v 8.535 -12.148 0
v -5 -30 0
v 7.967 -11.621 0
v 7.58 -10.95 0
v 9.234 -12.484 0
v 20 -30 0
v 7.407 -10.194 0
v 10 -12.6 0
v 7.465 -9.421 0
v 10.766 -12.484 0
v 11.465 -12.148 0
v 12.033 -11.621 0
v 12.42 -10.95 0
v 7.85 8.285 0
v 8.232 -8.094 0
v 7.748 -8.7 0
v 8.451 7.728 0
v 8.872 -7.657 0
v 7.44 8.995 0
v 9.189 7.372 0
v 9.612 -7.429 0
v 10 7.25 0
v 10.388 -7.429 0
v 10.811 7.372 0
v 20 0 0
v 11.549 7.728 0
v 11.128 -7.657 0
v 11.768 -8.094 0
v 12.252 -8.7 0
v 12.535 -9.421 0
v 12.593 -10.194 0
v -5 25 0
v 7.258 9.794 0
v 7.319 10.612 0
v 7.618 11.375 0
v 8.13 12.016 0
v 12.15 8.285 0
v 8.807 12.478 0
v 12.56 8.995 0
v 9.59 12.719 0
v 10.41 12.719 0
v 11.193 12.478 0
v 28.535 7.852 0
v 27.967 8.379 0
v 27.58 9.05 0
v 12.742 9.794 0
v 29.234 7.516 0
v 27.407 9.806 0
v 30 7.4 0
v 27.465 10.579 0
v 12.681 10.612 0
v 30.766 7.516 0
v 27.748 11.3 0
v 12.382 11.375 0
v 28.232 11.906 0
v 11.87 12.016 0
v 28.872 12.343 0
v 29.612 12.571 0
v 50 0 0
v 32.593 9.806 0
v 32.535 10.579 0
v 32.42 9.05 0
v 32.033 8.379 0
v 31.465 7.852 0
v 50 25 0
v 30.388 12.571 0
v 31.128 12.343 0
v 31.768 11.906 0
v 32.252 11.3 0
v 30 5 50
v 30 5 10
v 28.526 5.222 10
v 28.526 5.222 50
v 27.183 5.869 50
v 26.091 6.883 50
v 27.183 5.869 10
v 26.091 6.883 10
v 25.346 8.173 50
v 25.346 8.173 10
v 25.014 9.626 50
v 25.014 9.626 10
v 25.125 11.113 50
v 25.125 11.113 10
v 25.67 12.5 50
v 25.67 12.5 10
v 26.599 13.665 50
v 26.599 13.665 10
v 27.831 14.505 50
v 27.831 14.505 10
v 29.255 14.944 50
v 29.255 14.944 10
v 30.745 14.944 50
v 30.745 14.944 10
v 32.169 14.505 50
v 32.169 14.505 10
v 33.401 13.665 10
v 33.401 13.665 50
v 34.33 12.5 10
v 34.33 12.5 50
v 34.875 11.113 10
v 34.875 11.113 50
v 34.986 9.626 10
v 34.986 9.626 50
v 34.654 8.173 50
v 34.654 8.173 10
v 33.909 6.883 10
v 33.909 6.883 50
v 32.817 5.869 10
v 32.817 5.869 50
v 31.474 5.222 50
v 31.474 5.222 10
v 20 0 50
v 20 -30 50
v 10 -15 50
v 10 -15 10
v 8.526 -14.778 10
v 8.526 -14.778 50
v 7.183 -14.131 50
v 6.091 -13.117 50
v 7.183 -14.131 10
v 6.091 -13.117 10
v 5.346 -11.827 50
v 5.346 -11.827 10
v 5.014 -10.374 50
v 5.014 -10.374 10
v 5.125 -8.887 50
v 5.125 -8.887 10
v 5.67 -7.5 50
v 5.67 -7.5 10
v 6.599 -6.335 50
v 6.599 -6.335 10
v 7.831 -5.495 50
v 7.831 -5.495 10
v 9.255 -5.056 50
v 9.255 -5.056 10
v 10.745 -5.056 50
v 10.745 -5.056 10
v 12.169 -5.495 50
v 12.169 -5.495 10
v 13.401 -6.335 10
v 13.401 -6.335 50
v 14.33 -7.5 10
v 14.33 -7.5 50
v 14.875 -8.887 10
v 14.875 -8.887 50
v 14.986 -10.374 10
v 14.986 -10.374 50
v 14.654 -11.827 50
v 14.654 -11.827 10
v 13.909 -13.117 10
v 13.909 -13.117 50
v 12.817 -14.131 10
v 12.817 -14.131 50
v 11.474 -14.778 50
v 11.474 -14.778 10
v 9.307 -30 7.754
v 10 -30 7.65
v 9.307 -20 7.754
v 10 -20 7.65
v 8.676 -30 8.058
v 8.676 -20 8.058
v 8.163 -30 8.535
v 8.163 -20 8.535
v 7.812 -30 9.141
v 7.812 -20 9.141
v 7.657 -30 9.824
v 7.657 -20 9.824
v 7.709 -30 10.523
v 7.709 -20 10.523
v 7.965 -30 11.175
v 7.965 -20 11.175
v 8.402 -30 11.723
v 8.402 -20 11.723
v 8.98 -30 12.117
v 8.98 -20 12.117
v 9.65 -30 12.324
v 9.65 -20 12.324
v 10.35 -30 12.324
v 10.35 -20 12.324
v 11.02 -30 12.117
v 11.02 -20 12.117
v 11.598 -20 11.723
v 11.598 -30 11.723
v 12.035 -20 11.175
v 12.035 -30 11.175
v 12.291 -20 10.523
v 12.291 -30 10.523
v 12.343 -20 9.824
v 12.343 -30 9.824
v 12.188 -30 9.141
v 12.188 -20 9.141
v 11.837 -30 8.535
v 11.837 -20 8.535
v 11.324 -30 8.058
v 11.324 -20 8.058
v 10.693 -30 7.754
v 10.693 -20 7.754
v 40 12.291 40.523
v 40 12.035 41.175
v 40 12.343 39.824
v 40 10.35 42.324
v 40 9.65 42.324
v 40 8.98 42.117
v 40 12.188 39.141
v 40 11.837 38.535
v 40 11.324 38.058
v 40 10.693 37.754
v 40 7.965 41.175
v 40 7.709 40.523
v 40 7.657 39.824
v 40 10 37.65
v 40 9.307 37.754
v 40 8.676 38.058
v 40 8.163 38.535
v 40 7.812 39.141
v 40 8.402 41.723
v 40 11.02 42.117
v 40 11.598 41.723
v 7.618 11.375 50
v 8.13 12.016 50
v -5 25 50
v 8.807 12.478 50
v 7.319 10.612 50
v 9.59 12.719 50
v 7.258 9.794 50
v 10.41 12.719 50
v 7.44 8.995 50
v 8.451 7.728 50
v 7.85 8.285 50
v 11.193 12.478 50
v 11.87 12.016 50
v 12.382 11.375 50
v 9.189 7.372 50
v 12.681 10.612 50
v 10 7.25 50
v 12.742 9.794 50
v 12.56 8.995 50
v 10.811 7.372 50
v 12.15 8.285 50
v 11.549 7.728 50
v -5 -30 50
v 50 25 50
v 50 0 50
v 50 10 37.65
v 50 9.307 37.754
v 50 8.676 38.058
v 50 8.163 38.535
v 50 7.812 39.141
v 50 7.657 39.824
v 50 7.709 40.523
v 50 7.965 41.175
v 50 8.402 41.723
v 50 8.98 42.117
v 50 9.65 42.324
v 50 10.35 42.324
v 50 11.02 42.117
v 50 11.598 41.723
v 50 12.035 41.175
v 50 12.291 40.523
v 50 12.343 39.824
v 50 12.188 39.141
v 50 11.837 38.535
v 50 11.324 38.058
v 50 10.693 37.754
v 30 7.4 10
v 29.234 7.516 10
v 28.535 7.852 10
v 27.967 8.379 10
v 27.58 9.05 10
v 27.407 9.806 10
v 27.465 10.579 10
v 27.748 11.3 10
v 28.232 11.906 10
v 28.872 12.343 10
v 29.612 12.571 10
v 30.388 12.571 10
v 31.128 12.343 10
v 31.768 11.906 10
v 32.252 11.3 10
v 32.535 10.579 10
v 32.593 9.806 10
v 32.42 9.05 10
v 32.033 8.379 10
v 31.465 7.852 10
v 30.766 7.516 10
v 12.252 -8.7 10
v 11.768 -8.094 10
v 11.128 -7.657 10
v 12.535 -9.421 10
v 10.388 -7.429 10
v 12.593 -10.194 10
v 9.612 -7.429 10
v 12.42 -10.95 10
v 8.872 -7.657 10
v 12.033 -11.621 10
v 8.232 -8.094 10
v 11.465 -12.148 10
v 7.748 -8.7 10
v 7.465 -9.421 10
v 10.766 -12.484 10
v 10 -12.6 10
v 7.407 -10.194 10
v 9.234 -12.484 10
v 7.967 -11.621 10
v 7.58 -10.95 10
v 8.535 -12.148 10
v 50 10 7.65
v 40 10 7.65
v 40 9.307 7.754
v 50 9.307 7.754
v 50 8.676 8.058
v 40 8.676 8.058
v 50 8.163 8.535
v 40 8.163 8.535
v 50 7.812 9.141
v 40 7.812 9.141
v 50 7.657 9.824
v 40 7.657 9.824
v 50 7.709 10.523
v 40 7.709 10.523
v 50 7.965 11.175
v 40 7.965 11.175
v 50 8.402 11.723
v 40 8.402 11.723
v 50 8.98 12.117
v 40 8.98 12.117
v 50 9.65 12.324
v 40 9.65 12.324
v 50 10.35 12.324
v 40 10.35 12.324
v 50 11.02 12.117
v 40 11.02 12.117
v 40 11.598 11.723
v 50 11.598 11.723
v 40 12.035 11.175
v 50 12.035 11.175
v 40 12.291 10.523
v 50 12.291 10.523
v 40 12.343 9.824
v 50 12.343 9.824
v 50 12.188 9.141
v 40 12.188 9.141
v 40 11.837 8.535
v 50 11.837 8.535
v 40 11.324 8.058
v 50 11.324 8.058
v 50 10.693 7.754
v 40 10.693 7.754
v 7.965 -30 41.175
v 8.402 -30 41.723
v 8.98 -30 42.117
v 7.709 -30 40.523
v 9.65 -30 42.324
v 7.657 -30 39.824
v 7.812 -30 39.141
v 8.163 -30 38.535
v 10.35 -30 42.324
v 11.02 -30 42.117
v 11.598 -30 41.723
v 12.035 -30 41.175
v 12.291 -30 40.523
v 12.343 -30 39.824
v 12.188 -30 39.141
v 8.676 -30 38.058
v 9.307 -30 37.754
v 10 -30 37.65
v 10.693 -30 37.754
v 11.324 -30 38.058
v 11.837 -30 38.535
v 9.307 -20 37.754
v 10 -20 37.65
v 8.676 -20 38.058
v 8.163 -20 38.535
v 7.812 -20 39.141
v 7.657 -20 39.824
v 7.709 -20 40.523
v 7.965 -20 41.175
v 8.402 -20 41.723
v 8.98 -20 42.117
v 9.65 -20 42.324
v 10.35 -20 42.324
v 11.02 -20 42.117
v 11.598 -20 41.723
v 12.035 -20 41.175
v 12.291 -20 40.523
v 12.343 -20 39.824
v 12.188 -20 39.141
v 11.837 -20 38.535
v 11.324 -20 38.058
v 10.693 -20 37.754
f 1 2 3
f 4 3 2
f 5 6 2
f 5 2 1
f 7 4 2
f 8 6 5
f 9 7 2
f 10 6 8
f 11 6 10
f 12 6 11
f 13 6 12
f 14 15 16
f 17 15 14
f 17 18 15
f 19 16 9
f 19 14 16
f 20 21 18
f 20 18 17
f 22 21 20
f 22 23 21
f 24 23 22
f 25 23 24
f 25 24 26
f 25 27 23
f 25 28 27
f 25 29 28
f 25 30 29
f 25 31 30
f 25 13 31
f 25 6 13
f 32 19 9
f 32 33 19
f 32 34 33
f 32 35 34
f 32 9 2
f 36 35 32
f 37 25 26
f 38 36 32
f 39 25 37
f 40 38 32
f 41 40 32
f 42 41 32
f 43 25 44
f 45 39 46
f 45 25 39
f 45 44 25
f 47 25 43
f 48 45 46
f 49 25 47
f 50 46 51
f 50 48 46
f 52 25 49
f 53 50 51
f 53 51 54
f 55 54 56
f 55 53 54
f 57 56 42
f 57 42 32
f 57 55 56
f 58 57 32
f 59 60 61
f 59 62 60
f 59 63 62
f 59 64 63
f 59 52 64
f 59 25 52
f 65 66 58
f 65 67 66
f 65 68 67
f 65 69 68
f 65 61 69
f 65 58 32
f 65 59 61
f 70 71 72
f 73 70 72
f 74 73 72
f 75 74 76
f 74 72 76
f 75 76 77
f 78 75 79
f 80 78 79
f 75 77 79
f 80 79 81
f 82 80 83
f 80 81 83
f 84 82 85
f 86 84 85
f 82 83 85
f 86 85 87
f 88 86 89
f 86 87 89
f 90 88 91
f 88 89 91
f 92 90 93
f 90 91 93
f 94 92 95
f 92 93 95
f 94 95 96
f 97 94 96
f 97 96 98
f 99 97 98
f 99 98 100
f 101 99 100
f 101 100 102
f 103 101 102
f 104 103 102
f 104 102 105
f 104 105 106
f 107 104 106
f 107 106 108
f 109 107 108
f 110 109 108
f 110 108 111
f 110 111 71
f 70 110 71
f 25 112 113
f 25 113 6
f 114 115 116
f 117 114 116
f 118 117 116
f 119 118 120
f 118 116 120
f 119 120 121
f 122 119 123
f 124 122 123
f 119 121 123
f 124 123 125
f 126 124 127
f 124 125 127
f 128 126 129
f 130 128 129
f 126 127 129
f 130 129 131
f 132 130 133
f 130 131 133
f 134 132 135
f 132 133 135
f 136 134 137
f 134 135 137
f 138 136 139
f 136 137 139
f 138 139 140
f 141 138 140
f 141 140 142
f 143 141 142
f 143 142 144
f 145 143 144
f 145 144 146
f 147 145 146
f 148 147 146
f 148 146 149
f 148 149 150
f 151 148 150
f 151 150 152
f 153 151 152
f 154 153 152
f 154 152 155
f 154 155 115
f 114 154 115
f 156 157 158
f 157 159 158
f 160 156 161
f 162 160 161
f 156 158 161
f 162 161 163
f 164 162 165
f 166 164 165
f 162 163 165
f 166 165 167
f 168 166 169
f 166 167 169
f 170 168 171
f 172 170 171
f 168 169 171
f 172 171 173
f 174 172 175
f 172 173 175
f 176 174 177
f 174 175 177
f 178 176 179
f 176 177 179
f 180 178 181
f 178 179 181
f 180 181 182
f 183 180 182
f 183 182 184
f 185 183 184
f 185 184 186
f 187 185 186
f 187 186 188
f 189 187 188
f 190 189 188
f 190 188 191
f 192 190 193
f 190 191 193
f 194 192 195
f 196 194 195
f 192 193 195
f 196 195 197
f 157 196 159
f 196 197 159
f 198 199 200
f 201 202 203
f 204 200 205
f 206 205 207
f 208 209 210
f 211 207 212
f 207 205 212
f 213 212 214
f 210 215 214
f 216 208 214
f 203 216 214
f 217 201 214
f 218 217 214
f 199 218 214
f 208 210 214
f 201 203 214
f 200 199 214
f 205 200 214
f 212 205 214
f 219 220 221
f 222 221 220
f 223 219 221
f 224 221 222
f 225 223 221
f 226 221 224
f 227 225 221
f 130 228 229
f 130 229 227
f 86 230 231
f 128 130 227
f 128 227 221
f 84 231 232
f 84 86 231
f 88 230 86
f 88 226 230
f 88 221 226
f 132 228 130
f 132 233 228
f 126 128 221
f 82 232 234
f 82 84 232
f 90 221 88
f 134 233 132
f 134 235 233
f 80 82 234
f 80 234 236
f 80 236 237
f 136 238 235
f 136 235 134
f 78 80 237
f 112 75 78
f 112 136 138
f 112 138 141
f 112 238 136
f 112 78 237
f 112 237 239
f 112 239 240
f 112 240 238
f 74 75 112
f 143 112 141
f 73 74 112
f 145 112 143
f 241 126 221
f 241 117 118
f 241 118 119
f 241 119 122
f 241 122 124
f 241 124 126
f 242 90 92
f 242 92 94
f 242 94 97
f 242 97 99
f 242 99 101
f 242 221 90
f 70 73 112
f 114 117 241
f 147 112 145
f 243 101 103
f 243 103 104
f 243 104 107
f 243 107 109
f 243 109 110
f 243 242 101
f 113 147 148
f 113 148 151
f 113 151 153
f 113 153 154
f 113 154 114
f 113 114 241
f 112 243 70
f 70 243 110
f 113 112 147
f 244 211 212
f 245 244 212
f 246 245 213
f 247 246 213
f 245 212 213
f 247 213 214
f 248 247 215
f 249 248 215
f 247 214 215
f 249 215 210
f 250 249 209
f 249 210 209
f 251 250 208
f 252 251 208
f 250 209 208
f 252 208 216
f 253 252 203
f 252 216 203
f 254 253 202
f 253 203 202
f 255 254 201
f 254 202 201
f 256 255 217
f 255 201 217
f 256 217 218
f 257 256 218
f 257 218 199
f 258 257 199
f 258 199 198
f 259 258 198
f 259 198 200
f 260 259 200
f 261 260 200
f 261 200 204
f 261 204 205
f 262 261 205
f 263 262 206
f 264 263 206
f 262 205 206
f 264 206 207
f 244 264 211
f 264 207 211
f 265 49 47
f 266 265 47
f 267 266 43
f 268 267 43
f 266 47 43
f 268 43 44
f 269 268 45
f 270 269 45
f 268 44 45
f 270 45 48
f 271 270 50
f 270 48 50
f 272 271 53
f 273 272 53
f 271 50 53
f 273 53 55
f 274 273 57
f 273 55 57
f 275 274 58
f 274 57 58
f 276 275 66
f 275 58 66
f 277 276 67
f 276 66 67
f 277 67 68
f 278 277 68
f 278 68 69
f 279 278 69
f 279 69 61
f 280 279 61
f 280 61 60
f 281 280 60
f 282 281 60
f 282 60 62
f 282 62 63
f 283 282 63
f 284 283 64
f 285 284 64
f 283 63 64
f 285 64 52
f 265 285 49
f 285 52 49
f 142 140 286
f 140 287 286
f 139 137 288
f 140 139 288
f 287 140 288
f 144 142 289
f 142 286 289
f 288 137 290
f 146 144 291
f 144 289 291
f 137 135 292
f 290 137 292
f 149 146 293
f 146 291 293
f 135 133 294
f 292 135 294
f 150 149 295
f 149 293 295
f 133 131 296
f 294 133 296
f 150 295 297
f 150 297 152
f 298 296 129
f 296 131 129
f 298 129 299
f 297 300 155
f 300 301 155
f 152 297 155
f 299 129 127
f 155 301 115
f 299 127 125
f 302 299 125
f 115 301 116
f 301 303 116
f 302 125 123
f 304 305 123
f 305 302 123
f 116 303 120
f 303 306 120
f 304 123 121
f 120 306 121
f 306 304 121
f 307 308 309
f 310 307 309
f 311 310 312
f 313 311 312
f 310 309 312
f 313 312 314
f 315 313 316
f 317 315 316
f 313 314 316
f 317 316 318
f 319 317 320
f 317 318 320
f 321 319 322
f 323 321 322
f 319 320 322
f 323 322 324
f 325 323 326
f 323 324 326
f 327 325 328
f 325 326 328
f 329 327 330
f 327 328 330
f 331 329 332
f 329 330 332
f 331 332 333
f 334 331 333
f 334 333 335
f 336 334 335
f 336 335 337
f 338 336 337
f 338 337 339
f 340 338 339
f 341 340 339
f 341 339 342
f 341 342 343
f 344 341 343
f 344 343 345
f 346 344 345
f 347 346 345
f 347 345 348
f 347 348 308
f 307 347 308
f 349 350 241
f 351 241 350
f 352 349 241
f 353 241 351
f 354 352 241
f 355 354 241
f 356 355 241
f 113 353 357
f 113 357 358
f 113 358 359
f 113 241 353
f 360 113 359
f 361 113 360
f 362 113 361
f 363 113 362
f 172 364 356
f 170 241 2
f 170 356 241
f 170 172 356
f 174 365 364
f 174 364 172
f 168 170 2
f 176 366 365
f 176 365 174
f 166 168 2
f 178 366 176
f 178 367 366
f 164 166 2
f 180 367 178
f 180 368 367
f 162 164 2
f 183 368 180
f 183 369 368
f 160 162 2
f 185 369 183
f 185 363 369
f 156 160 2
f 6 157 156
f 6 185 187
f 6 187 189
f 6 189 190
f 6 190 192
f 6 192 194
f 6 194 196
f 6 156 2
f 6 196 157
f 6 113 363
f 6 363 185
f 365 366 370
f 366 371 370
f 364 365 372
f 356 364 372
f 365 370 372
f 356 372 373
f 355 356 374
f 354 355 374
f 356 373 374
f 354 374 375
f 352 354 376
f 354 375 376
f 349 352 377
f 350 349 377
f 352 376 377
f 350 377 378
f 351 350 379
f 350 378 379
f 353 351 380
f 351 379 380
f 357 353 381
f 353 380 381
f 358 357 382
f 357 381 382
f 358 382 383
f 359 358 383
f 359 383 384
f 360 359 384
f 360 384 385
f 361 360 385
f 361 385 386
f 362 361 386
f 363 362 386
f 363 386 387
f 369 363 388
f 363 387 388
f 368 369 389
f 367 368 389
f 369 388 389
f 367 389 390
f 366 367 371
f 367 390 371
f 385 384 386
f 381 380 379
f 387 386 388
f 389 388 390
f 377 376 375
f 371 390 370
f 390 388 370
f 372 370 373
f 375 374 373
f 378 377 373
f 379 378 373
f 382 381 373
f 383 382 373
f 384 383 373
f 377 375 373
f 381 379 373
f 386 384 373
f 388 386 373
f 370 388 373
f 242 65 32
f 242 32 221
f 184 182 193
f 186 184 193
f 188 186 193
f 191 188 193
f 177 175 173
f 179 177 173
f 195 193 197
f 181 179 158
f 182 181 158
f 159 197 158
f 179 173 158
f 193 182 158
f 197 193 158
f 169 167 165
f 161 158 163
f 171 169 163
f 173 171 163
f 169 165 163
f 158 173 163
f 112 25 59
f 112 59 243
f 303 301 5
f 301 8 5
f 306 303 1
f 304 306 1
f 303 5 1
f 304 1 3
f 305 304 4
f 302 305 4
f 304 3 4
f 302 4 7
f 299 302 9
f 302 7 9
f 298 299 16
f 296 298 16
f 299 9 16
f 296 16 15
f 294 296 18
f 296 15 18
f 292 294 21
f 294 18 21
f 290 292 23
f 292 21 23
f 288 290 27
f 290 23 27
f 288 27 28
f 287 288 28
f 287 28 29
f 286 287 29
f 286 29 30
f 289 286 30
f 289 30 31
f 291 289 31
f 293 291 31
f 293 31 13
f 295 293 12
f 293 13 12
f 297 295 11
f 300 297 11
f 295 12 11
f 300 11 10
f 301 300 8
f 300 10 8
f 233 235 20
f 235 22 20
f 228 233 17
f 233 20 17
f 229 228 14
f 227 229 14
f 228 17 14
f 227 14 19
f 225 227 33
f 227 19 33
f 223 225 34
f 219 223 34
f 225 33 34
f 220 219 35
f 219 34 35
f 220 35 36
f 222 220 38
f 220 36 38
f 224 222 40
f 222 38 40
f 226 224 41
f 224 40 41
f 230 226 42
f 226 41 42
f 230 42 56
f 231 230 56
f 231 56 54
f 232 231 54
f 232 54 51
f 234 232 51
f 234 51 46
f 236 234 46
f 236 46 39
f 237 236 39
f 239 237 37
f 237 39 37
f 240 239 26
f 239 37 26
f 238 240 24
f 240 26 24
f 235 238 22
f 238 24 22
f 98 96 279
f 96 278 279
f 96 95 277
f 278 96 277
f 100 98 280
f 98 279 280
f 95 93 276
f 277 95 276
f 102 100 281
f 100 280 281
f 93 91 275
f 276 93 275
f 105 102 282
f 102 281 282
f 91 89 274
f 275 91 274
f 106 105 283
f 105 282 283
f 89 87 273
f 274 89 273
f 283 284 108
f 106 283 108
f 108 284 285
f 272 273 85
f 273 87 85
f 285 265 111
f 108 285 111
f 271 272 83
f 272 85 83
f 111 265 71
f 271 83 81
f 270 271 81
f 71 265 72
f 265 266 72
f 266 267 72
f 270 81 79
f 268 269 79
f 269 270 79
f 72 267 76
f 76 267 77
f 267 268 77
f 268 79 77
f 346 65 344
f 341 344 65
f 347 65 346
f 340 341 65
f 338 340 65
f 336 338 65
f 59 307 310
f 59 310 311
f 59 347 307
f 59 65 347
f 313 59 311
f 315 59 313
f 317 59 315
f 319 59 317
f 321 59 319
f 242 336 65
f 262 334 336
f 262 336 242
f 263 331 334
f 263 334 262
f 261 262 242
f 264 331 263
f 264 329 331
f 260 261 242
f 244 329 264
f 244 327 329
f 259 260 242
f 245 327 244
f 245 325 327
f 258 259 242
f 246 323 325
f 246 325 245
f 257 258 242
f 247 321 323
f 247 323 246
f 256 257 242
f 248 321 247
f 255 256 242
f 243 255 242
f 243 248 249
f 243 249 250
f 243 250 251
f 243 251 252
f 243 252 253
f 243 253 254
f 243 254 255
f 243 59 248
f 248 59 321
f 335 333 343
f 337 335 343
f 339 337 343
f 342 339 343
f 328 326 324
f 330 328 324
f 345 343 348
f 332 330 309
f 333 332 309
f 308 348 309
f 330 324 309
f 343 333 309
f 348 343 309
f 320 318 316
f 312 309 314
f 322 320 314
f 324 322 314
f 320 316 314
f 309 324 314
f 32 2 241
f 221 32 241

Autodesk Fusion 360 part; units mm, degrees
sketch "Skizze1" plane through (0, 0, 0) normal (0, 0, 1) x (1, 0, 0)
  line L0 (0, 0) -> (20, 0)
  line L1 (20, 0) -> (20, 20)
  line L2 (20, 20) -> (0, 20)
  line L3 (0, 20) -> (0, 0)
  dimension "d1" = 20
  dimension "d2" = 20
extrude "Extrusion1" add sketch "Skizze1" along normal blind 50
extrude "Extrusion2" add 1 faces at (20, 6.6667, 16.6667) along direction (1, 0, 0) blind 20
sketch "Skizze2" plane through (0, 0, 0) normal (0, -1, 0) x (1, 0, 0)
  line L0 (0, 0) -> (40, 0)
  line L1 (40, 0) -> (40, 50)
  line L2 (40, 50) -> (0, 50)
  line L3 (0, 50) -> (0, 0)
  line L4 (0, 50) -> (20, 50)
  line L5 (20, 50) -> (20, 0)
  line L6 (20, 0) -> (0, 0)
  line L7 (0, 0) -> (0, 50)
  dimension "d7" = 20
  dimension "d8" = 50
extrude "Extrusion3" add sketch "Skizze2" along normal blind 20 contours L0 L2 L3 L4 L5 L6 L7
hole "Bohrung1" at (10, 10, 50) direction (0, 0, -1) diameter 5.5 depth 50 tip angle 118
hole "Bohrung2" at (30, 10, 50) direction (0, 0, -1) diameter 5.2 depth 50 tip angle 118 counterbore diameter 10 counterbore depth 40
hole "Bohrung3" at (10, -10, 50) direction (0, 0, -1) diameter 5.2 depth 50 tip angle 180 counterbore diameter 10 counterbore depth 40
extrude "Extrusion4" add 1 faces at (40, 6.6667, 16.6667) along direction (1, 0, 0) blind 10
extrude "Extrusion5" add 1 faces at (6.6667, -20, 16.6667) along direction (0, -1, 0) blind 10
hole "Bohrung4" at (50, 10, 40) direction (-1, 0, 0) diameter 4.7 depth 10 tip angle 180
hole "Bohrung5" at (50, 10, 10) direction (-1, 0, 0) diameter 4.7 depth 10 tip angle 180
hole "Bohrung6" at (10, -30, 40) direction (0, 1, 0) diameter 4.7 depth 10 tip angle 180
hole "Bohrung7" at (10, -30, 10) direction (0, 1, 0) diameter 4.7 depth 10 tip angle 180
extrude "Extrusion6" add 1 faces at (33.3333, 20, 33.3333) along direction (0, 1, 0) blind 5
extrude "Extrusion7" add 1 faces at (0, 6.6667, 33.3333) along direction (-1, 0, 0) blind 5
